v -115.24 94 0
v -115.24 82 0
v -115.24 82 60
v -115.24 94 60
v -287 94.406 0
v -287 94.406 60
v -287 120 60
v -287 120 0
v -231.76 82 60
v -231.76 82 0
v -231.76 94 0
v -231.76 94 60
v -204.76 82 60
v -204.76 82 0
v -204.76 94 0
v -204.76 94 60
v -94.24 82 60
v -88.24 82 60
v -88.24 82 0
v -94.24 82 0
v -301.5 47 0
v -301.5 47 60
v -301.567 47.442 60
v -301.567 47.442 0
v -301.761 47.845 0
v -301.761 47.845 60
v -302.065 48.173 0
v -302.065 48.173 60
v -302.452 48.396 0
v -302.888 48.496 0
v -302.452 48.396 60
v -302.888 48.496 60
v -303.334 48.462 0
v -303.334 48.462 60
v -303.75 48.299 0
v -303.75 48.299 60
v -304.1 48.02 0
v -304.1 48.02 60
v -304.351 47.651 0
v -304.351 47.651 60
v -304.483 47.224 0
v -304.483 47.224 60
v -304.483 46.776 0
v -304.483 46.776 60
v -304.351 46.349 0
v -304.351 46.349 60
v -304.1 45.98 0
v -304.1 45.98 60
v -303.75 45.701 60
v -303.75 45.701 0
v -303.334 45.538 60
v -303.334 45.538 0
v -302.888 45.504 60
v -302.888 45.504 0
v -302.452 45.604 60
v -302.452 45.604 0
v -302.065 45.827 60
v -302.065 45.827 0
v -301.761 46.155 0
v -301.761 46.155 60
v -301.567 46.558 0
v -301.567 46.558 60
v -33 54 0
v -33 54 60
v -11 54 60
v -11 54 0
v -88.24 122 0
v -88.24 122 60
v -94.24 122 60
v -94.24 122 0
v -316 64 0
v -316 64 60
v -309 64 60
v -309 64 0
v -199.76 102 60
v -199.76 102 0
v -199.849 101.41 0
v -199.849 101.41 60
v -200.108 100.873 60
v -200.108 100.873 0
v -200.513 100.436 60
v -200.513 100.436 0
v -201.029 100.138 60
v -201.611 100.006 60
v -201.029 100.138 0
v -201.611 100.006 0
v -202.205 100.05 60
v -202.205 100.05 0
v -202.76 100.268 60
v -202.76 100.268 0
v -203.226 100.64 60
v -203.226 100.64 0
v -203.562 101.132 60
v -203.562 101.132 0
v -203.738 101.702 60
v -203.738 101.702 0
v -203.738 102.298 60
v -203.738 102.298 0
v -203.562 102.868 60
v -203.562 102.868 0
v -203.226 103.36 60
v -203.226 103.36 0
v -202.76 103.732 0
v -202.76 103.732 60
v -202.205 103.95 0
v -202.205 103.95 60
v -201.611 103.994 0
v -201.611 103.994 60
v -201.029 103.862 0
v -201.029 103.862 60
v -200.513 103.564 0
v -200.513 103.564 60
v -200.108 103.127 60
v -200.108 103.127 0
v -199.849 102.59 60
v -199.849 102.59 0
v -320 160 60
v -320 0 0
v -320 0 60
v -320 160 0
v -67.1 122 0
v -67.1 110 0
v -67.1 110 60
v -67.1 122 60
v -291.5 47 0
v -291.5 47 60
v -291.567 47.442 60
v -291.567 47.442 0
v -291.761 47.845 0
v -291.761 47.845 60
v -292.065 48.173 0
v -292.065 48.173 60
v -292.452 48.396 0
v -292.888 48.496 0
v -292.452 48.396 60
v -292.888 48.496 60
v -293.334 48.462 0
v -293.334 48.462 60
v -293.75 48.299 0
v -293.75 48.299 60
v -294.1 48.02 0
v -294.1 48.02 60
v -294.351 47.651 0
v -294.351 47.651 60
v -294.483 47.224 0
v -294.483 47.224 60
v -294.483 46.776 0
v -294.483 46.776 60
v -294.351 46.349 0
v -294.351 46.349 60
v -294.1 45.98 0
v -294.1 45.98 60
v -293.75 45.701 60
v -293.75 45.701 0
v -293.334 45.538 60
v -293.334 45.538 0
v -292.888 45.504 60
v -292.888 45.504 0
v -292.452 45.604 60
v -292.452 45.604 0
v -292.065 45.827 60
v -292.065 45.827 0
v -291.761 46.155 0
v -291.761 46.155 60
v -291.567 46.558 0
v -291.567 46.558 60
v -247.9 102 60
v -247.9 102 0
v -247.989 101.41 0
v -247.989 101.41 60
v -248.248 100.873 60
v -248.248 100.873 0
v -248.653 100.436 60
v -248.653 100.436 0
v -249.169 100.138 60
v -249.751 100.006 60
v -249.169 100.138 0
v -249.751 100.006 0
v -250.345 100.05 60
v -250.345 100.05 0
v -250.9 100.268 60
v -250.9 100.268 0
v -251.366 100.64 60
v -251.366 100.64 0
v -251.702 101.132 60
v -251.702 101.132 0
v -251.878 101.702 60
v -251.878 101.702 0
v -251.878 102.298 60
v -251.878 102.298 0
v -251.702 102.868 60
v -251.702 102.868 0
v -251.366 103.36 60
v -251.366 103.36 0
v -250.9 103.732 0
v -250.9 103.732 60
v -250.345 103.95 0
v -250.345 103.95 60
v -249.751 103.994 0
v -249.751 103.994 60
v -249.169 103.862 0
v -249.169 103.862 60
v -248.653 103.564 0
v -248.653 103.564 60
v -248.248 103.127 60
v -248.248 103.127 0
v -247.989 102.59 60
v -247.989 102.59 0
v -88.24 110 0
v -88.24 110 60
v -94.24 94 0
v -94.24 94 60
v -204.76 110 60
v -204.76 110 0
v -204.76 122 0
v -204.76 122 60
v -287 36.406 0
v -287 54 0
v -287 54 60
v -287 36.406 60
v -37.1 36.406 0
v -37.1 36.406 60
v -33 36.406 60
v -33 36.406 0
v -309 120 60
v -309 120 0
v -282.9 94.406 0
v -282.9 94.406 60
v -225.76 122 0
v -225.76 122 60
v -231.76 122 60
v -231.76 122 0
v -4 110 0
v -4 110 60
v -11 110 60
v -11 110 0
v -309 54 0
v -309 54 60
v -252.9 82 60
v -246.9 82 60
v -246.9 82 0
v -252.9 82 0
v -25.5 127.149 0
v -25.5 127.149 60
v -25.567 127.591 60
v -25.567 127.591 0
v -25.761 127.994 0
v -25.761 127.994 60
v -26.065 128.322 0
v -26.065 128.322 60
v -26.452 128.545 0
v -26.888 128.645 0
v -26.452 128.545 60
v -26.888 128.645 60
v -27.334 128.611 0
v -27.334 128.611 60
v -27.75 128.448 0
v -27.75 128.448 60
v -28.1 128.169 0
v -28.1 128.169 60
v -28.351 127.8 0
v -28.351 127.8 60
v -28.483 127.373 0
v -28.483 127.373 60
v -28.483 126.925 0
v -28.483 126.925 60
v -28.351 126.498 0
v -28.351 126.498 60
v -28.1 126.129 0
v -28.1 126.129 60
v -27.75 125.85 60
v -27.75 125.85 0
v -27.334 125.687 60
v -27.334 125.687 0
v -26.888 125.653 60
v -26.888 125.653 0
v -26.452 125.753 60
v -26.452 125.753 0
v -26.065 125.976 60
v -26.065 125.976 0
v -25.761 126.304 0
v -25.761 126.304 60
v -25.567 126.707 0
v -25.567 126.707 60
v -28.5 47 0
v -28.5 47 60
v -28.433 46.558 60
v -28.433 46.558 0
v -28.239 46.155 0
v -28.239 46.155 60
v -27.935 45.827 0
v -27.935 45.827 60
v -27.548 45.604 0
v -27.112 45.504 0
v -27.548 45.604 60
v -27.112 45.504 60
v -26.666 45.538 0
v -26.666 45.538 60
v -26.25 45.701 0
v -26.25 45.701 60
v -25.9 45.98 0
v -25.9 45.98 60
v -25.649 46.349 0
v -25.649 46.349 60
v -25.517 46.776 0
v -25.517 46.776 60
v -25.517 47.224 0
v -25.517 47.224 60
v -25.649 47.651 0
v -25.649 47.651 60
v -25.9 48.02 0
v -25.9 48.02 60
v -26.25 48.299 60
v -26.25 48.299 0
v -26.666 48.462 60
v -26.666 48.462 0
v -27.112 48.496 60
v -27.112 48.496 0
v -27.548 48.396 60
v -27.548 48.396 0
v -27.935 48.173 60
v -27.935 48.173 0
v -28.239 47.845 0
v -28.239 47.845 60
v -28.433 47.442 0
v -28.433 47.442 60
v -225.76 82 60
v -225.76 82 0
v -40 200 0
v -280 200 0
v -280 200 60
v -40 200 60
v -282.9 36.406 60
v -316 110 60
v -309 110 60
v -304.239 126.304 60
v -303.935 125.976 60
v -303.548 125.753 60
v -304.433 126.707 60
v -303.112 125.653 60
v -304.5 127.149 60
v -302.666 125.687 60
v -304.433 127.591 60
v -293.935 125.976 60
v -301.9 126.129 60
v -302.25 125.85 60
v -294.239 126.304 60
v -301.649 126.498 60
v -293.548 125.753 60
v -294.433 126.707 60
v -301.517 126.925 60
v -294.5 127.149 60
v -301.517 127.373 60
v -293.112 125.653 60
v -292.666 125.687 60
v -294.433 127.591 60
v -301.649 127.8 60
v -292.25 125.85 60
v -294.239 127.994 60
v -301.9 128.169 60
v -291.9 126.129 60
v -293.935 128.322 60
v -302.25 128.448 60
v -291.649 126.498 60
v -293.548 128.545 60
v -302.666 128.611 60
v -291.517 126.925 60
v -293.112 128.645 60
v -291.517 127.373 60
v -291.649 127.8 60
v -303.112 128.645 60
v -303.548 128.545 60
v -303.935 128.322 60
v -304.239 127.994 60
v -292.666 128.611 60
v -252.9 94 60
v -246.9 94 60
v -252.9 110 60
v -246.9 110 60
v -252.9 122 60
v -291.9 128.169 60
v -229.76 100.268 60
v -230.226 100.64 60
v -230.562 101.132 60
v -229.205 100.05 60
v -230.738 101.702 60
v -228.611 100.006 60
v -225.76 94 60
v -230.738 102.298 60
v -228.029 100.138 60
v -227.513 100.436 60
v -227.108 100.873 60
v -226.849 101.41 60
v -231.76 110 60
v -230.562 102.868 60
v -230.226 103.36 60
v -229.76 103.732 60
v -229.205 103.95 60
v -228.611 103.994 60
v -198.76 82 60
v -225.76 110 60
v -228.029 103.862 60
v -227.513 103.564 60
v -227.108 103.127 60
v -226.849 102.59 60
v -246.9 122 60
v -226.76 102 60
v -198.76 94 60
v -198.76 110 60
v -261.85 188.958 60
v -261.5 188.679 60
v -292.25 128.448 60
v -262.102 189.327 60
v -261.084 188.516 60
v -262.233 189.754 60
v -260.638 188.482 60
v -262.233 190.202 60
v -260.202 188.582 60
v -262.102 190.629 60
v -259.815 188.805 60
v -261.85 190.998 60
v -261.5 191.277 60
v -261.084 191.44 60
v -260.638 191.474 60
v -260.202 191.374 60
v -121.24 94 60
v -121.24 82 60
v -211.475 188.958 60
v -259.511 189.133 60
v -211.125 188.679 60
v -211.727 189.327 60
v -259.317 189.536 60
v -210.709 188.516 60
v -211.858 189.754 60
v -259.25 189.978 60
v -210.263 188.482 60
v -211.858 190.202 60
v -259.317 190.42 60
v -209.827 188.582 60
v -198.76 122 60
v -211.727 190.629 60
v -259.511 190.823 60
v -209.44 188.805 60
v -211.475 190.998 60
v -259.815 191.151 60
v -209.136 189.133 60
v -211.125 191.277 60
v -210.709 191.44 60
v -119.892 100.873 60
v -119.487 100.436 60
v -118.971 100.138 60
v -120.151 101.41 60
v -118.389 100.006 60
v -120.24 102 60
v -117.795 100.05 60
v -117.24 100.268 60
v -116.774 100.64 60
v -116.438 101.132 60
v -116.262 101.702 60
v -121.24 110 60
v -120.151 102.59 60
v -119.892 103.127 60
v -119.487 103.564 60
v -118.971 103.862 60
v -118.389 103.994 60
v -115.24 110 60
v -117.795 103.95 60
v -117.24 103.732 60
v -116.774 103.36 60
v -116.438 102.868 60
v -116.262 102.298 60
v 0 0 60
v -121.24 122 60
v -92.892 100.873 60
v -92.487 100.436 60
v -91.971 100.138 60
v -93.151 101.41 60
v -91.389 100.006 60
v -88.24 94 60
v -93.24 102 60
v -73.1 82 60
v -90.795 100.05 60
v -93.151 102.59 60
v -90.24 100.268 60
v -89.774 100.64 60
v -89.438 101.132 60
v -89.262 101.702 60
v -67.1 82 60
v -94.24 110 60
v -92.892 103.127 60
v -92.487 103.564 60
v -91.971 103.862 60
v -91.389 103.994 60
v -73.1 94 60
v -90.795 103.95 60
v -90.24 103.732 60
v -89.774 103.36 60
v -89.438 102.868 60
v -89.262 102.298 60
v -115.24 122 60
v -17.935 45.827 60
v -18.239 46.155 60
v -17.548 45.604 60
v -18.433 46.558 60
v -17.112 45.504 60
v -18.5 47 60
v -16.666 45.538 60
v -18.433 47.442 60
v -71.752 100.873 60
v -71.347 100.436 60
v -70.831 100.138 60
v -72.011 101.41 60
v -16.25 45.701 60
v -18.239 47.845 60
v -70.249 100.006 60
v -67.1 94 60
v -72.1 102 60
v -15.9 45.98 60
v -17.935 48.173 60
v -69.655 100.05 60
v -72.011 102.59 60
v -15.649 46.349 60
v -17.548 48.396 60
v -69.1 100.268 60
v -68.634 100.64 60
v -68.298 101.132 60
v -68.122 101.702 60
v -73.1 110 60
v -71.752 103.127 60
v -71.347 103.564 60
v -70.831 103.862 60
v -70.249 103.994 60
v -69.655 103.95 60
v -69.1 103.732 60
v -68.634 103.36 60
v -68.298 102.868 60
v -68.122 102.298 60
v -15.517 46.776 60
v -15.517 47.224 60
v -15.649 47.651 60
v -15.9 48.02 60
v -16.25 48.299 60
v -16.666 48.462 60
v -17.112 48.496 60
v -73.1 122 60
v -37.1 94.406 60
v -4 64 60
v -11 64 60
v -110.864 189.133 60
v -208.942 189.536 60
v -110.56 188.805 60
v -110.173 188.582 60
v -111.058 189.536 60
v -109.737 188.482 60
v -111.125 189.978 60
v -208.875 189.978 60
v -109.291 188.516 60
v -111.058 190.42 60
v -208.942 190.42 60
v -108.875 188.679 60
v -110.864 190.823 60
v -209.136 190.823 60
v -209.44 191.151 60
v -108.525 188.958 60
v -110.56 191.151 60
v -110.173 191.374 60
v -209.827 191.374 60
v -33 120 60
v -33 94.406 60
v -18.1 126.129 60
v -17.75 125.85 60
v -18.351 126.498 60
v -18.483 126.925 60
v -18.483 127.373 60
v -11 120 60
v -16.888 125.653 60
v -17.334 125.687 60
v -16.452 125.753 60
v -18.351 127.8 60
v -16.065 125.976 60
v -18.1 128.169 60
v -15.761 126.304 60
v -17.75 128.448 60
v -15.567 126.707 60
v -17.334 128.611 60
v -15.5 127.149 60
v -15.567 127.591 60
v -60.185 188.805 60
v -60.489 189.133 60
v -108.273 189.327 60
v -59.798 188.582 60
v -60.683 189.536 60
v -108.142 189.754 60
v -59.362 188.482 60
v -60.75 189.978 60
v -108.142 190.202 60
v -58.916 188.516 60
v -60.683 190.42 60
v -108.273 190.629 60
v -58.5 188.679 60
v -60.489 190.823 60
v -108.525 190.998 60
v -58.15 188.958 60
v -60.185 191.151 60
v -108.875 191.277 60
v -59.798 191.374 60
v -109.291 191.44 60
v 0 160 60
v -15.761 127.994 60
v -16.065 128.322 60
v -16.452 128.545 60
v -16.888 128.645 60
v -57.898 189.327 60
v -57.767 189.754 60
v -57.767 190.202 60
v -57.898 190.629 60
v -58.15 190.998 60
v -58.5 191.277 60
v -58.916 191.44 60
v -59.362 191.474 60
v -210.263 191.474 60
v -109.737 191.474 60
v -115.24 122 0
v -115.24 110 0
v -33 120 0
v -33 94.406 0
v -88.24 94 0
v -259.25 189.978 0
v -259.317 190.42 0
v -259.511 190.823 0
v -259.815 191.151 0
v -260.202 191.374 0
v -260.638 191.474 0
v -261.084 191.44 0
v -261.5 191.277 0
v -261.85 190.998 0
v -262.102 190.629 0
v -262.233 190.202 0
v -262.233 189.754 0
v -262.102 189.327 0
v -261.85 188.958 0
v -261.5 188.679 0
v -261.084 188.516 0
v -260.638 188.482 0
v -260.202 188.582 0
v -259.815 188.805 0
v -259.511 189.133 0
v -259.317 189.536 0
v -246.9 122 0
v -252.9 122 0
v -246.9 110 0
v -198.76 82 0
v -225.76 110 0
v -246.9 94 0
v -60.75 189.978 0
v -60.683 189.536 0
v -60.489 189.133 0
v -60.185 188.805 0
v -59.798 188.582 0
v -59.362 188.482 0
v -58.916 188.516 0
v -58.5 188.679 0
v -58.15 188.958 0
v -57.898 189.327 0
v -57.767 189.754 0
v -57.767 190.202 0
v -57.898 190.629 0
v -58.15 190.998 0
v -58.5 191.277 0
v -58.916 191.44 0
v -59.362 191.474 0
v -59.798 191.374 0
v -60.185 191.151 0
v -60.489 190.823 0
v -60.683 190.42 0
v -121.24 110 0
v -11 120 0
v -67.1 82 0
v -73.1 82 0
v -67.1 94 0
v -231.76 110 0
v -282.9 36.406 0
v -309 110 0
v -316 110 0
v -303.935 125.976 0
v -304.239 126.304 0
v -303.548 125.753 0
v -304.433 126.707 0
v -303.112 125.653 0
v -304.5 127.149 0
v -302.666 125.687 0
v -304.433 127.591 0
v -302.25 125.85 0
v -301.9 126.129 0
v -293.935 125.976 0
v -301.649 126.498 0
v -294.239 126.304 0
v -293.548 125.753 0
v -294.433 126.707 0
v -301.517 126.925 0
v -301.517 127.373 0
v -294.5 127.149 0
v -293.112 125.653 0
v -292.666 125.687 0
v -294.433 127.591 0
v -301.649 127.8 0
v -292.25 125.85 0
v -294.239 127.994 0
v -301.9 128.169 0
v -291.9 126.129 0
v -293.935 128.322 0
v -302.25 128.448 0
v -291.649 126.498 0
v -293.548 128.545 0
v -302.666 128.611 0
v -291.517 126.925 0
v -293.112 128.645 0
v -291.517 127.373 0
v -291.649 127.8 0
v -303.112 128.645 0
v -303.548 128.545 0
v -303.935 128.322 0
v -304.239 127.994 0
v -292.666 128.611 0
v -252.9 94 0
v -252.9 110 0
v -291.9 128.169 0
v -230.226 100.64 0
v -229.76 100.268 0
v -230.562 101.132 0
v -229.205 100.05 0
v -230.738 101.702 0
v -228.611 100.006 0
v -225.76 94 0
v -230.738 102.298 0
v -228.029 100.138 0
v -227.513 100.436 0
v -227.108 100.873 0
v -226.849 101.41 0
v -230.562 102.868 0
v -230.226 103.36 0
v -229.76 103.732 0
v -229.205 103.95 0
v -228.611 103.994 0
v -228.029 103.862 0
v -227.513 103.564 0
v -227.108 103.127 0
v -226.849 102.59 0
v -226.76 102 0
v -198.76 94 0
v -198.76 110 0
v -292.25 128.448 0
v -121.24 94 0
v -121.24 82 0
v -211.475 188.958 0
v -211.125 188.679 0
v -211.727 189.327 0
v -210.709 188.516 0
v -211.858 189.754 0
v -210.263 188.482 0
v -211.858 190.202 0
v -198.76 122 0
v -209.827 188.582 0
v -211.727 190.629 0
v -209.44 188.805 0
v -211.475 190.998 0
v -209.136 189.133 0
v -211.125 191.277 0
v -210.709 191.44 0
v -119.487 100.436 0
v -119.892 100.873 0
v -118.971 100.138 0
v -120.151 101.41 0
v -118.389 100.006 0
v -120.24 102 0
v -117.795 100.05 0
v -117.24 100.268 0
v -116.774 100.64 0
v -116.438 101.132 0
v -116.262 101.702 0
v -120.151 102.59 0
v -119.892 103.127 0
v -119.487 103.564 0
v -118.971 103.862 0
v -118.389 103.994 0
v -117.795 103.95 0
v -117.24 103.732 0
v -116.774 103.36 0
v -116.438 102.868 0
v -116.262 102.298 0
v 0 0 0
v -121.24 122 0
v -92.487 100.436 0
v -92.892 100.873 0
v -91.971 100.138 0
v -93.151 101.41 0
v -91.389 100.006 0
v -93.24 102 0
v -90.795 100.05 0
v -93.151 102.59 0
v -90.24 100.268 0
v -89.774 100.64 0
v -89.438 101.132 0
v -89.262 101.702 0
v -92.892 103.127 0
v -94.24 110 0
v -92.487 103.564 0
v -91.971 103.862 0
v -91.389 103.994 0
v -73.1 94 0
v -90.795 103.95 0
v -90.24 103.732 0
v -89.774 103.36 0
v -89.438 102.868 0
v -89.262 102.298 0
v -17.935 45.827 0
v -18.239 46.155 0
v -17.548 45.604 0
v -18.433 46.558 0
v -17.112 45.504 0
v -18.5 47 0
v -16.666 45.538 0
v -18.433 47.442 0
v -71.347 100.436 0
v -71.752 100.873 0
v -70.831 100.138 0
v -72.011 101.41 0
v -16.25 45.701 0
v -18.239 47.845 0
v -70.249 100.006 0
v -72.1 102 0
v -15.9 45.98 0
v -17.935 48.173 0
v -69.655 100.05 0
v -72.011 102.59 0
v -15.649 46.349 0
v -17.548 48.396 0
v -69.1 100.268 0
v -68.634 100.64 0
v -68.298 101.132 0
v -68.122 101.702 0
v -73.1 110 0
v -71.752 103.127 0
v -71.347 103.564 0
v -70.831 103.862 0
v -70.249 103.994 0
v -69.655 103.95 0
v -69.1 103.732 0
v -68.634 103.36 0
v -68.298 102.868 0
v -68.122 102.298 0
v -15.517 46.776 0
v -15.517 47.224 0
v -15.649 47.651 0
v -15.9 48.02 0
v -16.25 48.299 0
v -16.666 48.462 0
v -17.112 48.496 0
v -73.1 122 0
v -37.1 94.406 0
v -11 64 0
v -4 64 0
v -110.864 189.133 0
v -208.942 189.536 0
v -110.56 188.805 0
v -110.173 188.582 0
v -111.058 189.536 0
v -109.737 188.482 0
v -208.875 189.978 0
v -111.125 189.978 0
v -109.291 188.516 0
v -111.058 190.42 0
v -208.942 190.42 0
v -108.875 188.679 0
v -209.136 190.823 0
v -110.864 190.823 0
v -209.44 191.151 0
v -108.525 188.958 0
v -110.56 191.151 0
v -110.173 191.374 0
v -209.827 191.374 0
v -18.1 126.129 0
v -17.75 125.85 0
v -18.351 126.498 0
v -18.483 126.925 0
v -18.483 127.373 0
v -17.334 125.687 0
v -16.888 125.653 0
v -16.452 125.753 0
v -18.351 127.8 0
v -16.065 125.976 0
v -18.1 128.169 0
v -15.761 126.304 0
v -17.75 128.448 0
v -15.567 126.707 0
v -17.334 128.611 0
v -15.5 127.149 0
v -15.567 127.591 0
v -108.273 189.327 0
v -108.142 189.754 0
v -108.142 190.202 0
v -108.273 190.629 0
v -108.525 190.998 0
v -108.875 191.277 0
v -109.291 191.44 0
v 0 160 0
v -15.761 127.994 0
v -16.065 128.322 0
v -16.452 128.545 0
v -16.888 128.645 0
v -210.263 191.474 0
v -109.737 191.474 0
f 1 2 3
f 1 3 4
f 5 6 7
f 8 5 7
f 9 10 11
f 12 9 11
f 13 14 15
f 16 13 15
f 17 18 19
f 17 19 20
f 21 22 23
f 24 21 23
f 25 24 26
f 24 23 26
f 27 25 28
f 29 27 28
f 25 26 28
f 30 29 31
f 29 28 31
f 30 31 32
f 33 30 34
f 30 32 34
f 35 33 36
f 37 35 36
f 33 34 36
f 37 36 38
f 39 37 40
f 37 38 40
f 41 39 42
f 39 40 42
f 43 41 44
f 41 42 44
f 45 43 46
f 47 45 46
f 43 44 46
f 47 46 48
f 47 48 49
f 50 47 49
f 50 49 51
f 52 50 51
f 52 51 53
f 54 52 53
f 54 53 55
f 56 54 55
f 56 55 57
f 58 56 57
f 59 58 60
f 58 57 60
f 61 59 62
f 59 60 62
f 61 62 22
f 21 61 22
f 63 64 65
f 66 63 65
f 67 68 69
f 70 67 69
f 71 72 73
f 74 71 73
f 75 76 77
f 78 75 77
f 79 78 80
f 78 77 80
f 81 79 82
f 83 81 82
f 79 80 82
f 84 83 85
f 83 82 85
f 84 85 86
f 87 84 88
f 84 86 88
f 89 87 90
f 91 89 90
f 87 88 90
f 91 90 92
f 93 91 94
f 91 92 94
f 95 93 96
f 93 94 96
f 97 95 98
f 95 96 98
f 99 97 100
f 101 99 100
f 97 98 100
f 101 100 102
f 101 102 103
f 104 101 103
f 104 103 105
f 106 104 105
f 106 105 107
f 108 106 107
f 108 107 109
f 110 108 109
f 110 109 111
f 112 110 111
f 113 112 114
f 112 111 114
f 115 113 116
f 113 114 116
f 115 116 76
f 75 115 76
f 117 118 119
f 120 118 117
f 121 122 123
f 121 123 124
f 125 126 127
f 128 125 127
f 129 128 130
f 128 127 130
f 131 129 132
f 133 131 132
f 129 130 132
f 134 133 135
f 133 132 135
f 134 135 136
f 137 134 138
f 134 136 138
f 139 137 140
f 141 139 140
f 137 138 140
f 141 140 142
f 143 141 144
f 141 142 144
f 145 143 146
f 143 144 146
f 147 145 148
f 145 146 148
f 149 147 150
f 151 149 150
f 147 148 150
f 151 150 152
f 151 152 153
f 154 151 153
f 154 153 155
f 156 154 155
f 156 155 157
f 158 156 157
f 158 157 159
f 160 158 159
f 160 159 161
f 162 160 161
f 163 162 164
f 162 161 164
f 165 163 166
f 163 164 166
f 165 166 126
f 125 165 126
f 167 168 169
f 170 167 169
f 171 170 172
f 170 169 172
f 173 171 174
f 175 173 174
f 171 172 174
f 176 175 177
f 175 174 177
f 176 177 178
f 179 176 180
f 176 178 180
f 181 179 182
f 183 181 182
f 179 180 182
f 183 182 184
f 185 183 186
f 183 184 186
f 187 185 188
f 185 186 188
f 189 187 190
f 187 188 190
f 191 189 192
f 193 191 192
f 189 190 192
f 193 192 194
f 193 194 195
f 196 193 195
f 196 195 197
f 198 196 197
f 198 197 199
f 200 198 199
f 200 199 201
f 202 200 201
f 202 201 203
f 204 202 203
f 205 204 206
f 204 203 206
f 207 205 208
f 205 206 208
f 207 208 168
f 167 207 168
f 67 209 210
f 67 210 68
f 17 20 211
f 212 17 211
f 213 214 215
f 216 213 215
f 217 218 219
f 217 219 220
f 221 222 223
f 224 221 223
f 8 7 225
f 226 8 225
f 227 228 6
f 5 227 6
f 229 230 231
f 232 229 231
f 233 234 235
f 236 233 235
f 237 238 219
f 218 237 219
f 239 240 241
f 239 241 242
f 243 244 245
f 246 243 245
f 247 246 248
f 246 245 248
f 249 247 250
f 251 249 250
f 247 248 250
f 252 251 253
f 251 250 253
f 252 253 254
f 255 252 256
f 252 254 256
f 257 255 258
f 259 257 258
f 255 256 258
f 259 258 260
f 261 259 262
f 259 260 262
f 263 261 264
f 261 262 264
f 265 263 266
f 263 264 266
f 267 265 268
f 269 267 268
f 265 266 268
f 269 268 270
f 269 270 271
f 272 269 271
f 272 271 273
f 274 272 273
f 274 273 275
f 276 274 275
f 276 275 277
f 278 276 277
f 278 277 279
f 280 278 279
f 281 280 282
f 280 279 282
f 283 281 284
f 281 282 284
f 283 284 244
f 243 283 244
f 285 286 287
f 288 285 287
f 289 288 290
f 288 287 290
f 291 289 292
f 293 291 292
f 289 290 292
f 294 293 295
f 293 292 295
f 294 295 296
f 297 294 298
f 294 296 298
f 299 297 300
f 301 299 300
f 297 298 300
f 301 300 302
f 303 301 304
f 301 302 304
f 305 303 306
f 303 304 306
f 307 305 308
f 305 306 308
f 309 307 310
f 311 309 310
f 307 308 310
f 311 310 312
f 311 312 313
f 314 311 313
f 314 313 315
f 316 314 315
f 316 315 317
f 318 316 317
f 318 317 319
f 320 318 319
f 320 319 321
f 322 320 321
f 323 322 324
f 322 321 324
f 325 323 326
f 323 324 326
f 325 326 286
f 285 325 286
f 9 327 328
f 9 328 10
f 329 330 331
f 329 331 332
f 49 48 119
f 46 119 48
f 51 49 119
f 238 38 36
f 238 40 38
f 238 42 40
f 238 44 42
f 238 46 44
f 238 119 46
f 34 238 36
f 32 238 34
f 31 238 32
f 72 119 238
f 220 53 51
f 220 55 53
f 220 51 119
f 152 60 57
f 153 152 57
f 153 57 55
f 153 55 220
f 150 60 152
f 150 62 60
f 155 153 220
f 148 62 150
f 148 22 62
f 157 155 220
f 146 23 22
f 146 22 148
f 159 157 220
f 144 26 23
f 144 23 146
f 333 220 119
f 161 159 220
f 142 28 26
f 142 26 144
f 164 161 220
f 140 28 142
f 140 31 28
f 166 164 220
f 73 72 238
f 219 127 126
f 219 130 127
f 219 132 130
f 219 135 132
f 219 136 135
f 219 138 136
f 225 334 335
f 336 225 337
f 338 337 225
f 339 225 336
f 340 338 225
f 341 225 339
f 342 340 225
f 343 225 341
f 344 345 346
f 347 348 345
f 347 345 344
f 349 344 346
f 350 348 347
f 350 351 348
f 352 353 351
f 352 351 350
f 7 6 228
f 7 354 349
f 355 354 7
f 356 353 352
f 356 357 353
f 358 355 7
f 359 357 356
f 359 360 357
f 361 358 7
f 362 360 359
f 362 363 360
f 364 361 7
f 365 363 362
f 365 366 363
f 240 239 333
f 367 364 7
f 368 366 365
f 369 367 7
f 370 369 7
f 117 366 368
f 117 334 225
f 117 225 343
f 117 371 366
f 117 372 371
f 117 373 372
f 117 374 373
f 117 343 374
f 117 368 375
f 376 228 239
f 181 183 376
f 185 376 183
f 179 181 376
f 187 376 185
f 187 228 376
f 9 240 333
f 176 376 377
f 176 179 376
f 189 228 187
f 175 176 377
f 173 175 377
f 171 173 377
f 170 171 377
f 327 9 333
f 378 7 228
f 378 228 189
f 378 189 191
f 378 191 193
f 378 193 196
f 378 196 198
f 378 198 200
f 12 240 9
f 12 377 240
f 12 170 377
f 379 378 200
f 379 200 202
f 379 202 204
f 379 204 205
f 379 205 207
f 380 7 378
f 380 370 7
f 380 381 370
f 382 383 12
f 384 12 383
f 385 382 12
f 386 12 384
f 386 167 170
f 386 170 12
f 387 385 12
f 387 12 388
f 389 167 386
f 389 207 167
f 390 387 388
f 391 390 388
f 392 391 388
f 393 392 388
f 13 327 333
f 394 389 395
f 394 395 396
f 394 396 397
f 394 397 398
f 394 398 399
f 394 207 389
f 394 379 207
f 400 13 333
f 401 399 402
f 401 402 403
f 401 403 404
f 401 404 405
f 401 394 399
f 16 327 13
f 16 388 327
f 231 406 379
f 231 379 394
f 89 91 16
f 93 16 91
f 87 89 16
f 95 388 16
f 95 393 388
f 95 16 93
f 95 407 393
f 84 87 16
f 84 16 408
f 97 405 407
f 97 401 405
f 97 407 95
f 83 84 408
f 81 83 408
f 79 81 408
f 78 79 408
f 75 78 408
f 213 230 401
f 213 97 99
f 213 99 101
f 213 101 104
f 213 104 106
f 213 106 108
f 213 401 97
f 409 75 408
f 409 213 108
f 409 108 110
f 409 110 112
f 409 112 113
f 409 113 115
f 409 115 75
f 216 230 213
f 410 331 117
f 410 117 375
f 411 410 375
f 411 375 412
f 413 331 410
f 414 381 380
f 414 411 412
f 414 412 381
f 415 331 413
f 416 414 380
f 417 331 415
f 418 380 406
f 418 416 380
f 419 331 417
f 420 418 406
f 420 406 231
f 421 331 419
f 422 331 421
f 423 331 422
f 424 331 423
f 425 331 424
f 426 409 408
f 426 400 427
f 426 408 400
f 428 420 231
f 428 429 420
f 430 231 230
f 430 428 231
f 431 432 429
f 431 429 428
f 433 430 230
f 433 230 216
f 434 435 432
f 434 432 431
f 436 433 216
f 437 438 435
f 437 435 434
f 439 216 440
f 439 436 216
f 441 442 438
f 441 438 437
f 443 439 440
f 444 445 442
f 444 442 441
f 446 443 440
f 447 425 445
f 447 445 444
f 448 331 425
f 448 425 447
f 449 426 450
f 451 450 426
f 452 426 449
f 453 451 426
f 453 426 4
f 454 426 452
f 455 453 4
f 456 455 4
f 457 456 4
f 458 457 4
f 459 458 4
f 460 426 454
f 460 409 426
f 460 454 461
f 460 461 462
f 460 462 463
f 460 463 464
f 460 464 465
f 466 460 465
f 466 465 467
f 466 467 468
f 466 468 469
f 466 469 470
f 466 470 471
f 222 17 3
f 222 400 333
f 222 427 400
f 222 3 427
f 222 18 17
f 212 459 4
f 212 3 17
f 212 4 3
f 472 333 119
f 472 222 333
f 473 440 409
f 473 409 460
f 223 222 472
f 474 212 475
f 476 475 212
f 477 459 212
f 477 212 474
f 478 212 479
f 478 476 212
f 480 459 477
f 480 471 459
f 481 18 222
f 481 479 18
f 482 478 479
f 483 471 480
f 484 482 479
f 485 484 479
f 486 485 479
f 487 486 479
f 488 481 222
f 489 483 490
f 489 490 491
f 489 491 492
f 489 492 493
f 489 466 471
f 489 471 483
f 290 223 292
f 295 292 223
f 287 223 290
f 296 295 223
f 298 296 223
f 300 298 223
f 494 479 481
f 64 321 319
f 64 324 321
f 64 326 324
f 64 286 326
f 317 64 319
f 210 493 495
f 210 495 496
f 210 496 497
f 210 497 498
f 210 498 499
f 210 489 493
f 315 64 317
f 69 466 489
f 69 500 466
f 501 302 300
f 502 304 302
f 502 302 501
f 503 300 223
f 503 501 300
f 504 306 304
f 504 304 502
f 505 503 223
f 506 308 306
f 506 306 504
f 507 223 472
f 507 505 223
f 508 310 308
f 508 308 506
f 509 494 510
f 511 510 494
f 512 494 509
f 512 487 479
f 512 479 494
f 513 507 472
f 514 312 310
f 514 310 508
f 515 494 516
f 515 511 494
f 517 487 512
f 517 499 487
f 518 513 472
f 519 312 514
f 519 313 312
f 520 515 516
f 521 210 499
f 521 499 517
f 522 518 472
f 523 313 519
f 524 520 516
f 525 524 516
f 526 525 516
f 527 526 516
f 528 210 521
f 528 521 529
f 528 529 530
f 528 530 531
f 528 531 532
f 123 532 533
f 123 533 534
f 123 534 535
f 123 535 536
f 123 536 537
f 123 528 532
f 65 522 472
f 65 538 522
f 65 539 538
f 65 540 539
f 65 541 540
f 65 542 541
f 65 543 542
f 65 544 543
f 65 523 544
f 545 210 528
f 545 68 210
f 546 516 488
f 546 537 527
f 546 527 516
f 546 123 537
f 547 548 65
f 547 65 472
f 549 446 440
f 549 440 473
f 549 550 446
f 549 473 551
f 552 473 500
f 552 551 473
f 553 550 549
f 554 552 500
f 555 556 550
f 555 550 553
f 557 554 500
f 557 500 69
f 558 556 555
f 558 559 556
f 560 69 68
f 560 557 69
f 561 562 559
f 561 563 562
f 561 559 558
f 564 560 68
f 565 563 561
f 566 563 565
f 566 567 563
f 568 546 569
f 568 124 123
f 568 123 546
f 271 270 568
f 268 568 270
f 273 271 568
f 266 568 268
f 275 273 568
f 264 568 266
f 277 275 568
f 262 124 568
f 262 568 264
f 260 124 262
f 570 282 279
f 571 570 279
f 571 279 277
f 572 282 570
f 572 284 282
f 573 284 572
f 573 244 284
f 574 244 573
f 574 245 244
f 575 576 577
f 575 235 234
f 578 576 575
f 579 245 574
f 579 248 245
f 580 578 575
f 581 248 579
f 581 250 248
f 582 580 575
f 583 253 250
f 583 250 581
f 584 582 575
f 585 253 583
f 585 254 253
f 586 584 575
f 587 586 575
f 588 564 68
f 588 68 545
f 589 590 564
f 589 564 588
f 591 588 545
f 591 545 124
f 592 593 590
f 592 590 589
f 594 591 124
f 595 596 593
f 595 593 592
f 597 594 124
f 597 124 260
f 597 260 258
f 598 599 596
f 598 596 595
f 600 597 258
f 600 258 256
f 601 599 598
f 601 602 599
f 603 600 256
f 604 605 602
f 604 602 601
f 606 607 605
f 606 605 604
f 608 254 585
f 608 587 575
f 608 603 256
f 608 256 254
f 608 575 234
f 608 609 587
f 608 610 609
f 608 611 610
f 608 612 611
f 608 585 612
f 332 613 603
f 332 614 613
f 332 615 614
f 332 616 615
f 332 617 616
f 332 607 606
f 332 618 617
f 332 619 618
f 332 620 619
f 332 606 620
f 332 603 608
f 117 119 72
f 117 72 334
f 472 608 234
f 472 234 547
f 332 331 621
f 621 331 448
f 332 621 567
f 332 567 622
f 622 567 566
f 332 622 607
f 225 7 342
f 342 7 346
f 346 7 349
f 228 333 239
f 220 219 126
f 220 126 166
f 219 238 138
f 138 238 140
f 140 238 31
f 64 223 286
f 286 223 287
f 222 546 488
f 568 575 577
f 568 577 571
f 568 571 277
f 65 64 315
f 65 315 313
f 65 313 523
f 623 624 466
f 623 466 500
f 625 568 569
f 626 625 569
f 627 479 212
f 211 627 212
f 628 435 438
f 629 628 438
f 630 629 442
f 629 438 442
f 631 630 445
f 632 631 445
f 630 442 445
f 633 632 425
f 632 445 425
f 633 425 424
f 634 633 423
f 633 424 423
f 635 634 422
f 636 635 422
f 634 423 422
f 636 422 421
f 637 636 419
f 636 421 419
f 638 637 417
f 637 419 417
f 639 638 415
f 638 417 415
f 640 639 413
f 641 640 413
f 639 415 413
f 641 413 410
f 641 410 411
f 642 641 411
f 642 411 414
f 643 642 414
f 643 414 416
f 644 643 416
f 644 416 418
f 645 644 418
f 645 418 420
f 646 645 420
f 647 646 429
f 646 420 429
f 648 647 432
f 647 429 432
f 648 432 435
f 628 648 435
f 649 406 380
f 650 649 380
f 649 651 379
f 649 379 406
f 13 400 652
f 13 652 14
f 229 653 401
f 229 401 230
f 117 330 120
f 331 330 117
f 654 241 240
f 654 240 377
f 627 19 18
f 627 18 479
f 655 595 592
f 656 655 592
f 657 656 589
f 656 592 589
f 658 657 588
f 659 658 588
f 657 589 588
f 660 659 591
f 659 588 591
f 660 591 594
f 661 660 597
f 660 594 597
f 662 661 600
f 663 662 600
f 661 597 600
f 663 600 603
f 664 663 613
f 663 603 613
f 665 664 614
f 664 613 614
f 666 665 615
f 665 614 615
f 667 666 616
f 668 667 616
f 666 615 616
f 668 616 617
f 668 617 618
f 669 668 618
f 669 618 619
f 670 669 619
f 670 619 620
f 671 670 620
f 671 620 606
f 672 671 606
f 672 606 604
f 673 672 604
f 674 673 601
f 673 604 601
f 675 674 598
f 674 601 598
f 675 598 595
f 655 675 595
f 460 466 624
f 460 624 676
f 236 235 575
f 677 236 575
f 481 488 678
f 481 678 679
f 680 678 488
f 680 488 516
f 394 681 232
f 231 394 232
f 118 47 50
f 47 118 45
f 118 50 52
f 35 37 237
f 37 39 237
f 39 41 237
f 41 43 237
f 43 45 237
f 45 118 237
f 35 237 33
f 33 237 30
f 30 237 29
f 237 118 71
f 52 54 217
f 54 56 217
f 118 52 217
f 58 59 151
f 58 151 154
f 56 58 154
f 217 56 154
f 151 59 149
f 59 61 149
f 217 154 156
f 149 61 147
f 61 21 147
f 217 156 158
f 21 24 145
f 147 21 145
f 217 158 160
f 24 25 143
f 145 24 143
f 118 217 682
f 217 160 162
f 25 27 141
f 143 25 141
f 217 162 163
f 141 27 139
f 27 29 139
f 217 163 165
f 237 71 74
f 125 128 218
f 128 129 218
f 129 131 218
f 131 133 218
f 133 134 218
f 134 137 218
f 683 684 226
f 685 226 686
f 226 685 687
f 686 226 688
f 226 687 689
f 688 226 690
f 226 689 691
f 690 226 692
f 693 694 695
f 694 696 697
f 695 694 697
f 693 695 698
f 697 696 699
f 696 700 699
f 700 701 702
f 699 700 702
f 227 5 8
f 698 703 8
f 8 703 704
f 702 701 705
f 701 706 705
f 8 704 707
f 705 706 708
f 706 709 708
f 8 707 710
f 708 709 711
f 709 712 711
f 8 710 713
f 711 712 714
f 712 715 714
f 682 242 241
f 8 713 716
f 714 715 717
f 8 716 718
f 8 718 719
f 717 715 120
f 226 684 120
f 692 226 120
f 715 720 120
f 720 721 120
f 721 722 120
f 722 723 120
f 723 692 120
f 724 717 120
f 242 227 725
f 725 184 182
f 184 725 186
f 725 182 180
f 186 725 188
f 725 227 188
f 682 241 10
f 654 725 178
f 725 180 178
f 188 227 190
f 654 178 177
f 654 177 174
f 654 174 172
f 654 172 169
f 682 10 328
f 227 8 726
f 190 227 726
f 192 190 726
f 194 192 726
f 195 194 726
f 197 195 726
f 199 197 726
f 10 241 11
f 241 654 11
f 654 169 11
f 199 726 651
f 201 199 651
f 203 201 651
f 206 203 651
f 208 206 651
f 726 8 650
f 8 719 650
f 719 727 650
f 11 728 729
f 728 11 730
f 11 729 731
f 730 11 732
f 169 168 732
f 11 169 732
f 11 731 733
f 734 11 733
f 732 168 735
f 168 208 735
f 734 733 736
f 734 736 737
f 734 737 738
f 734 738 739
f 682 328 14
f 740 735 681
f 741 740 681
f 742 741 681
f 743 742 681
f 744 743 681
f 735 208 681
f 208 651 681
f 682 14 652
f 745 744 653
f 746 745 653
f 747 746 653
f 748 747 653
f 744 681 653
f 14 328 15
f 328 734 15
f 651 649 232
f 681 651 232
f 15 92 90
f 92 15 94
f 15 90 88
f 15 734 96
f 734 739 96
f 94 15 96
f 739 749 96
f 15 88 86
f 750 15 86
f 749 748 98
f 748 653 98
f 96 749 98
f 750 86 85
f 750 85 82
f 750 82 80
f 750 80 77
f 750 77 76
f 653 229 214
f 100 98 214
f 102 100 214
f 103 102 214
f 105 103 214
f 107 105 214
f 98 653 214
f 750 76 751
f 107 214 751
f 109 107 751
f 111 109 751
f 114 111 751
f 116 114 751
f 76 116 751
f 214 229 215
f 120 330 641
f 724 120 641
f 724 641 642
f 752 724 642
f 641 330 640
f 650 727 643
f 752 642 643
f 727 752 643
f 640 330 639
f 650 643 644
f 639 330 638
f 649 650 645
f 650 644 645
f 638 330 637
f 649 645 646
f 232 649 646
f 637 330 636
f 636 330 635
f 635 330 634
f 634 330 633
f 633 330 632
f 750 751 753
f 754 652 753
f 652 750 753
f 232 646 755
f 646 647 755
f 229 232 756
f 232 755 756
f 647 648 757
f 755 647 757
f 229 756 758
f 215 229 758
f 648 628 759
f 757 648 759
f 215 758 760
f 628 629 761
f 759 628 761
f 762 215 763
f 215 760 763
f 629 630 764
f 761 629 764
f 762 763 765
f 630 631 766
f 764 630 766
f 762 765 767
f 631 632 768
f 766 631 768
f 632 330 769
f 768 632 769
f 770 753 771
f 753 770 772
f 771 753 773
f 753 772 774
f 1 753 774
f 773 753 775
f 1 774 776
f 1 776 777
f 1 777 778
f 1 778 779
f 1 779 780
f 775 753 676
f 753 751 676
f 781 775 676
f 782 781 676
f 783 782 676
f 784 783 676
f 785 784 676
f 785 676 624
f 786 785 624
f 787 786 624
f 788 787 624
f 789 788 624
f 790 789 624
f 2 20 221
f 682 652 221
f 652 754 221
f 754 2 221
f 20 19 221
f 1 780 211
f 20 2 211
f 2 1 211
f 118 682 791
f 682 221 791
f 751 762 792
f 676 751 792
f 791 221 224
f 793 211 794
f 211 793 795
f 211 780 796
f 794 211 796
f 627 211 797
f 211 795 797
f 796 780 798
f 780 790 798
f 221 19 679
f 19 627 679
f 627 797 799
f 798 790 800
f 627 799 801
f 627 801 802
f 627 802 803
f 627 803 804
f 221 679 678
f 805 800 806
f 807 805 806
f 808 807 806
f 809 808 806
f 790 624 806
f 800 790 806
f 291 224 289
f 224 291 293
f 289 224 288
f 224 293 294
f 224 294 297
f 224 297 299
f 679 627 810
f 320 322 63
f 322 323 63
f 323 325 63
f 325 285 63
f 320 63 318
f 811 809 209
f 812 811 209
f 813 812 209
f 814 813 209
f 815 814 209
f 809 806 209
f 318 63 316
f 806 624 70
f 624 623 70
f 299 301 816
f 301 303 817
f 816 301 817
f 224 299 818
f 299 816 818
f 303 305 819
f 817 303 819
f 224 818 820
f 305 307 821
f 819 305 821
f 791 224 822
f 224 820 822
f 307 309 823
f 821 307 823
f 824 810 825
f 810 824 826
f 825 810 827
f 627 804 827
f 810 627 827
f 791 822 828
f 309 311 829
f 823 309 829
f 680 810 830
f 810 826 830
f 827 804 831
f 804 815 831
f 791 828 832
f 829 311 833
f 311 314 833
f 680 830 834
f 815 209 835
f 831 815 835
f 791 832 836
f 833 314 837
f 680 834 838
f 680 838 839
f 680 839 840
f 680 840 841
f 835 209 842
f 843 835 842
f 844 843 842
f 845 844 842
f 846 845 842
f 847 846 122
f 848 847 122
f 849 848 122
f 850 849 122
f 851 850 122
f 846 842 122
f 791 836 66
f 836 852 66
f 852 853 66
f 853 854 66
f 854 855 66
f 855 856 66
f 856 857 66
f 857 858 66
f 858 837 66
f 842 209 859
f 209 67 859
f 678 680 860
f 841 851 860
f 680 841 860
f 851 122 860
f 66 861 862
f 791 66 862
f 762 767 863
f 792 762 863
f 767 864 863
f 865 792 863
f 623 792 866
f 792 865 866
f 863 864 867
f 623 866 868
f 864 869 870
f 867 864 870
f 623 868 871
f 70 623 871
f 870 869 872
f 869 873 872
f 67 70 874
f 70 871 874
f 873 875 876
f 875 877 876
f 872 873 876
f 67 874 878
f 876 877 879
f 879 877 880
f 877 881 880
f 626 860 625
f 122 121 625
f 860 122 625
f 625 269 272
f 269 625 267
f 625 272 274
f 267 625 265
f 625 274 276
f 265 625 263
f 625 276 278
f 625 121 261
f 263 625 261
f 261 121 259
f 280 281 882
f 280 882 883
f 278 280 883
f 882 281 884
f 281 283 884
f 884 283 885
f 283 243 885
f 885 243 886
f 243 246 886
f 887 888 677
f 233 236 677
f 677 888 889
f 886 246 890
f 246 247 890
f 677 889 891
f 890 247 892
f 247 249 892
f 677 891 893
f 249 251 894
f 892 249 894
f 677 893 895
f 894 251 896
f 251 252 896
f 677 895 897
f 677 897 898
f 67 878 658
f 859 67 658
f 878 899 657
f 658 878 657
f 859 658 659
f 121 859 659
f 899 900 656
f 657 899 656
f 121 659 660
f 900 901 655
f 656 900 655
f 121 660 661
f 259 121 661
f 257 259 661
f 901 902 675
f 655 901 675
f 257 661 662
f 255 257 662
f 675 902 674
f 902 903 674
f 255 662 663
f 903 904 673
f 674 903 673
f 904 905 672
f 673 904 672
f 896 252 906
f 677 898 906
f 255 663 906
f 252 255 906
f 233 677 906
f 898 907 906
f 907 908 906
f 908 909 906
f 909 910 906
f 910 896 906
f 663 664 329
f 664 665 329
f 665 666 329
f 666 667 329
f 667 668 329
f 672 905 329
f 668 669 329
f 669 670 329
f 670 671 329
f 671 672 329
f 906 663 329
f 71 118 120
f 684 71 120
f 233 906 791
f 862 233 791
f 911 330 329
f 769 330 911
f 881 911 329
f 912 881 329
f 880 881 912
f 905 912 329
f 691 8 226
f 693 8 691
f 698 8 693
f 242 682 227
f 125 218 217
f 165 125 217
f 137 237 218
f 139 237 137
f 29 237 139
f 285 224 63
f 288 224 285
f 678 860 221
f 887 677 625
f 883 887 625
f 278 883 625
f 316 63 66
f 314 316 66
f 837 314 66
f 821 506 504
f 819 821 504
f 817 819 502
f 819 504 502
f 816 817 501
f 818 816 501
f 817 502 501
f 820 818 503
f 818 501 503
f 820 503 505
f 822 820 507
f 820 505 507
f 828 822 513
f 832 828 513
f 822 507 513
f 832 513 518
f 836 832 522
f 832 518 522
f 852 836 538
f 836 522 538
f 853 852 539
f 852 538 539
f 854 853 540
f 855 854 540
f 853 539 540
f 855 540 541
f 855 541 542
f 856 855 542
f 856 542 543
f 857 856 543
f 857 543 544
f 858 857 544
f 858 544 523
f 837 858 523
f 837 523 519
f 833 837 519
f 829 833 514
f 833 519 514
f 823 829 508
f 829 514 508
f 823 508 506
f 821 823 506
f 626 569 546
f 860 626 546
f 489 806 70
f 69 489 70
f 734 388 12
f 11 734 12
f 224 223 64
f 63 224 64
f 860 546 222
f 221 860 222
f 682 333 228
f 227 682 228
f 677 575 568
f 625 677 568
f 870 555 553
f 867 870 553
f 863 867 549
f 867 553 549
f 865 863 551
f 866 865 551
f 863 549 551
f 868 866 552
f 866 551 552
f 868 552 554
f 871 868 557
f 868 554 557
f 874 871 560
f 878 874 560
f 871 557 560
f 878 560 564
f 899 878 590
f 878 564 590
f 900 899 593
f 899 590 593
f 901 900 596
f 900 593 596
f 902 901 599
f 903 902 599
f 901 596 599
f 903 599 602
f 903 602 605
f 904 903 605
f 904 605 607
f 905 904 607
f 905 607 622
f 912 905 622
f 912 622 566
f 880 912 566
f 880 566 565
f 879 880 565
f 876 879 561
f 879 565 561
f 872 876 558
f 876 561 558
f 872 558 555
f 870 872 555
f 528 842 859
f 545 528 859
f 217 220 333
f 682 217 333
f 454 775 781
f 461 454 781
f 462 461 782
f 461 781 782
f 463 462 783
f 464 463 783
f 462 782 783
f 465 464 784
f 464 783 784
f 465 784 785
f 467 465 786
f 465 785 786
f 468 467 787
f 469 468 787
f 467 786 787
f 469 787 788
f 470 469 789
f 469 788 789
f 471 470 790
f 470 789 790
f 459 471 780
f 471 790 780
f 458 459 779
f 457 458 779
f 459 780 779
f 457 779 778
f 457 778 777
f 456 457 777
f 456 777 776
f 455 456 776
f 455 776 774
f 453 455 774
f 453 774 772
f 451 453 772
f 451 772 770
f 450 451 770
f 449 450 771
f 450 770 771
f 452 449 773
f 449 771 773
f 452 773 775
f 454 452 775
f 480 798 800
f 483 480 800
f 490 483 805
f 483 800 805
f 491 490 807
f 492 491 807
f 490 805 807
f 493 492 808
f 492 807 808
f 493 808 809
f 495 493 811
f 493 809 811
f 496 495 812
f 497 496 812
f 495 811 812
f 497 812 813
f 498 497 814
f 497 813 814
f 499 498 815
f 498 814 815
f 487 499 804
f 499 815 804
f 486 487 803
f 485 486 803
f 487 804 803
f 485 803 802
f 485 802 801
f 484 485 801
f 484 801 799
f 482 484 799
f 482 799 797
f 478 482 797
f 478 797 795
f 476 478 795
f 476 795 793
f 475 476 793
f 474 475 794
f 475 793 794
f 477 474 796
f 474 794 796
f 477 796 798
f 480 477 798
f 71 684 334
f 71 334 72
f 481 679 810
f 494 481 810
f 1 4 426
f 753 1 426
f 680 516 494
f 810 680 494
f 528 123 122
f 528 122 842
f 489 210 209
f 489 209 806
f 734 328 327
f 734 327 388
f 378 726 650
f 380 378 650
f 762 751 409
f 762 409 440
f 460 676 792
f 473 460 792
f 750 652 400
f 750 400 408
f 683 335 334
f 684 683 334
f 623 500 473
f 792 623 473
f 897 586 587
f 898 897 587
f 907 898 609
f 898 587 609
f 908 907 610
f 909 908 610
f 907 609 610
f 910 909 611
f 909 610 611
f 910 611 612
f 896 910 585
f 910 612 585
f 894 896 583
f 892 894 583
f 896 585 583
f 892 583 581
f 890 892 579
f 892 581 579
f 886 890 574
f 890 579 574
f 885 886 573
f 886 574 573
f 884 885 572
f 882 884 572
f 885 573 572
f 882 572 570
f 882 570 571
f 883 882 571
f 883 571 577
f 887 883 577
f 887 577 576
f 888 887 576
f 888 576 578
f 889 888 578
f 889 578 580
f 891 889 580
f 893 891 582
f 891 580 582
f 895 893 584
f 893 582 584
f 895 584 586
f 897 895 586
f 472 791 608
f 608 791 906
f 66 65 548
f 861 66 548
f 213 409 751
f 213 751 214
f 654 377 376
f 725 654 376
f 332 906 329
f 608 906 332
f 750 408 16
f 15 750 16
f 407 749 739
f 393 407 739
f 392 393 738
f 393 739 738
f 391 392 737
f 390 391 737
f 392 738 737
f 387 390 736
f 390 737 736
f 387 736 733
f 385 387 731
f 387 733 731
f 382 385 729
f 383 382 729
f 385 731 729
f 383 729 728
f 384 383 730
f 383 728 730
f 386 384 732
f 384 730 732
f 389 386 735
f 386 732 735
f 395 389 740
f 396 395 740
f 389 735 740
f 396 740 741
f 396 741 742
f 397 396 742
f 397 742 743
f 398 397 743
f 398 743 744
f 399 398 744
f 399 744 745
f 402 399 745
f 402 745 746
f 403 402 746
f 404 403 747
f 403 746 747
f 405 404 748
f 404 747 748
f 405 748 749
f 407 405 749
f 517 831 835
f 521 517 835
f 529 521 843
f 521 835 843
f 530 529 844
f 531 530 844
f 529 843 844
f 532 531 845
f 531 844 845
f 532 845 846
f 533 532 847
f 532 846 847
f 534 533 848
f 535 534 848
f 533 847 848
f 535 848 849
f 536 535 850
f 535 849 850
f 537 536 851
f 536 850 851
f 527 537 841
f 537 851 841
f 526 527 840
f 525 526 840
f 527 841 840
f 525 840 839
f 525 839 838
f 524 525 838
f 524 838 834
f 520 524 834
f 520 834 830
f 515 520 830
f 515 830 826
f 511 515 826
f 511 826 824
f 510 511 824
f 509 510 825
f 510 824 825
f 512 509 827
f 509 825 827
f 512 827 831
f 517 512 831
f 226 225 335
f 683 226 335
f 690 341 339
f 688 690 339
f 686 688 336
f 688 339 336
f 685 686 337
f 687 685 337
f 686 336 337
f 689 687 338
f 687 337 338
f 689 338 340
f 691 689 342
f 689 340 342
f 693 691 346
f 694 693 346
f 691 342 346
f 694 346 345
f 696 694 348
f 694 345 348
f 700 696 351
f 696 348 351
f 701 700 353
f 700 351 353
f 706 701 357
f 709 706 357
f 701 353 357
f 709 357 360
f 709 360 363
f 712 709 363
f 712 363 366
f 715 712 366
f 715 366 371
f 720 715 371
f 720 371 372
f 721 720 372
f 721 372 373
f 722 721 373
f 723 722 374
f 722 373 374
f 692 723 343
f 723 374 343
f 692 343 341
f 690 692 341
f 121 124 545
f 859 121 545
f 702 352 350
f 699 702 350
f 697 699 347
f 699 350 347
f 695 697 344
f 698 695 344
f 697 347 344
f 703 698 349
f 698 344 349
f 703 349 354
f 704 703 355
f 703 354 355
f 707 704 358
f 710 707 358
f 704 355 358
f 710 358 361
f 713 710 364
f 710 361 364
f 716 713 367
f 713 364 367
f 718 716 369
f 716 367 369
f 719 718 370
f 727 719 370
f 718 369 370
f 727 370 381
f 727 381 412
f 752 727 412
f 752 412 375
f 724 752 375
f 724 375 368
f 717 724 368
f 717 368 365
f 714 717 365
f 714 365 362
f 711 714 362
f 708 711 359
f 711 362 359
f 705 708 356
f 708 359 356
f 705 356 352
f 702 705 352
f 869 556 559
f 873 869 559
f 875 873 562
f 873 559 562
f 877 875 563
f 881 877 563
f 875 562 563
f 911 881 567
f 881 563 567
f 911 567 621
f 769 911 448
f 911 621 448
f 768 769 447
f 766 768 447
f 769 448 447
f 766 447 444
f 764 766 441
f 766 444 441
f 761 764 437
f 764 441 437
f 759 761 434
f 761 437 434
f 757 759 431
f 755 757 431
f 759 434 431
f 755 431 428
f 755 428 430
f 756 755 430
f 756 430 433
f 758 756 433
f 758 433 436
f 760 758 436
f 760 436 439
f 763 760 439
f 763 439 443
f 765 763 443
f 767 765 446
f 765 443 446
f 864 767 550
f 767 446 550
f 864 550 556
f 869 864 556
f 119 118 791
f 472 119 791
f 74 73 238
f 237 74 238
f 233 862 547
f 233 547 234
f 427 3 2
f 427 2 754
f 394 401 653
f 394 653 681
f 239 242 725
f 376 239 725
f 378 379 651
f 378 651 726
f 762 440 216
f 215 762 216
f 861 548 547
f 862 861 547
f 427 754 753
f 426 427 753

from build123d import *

# Parameters (mm, degrees)
ESQUISSE1_W             = 320
ESQUISSE1_H             = 200
BOSS_EXTRU_1_DEPTH      = 60
ESQUISSE3_R             = 2
ESQUISSE3_W             = 6
ESQUISSE3_H             = 12
ENL_V_MAT_EXTRU_2_DEPTH = 60
CHANFREIN1_SIZE         = 40
ESQUISSE6_R             = 1.5
ENL_V_MAT_EXTRU_3_DEPTH = 60


with BuildPart() as part:
    # Esquisse1 → Boss.-Extru.1 (new body)
    with BuildSketch(Plane.XY):
        with Locations((-160, 100)):
            Rectangle(ESQUISSE1_W, ESQUISSE1_H)
    extrude(amount=BOSS_EXTRU_1_DEPTH)

    # Esquisse3 → Enlèv. mat.-Extru.2 (cut)
    with BuildSketch(Plane(origin=(0, 0, 0), x_dir=(-1, 0, 0), z_dir=(0, 0, -1))):
        with Locations((70.1, 102)):
            Circle(ESQUISSE3_R)
        with Locations((91.24, 102)):
            Circle(ESQUISSE3_R)
        with Locations((118.24, 102)):
            Circle(ESQUISSE3_R)
        with Locations(Location((201.76, 102, 0), (0, 0, 180))):
            Circle(ESQUISSE3_R)
        with Locations(Location((228.76, 102, 0), (0, 0, 180))):
            Circle(ESQUISSE3_R)
        with Locations(Location((249.9, 102, 0), (0, 0, 180))):
            Circle(ESQUISSE3_R)
        with Locations((70.1, 88)):
            Rectangle(ESQUISSE3_W, ESQUISSE3_H)
        with Locations((70.1, 116)):
            Rectangle(ESQUISSE3_W, ESQUISSE3_H)
        with Locations((91.24, 88)):
            Rectangle(ESQUISSE3_W, ESQUISSE3_H)
        with Locations((91.24, 116)):
            Rectangle(ESQUISSE3_W, ESQUISSE3_H)
        with Locations((118.24, 88)):
            Rectangle(ESQUISSE3_W, ESQUISSE3_H)
        with Locations((118.24, 116)):
            Rectangle(ESQUISSE3_W, ESQUISSE3_H)
        with Locations((201.76, 88)):
            Rectangle(ESQUISSE3_W, ESQUISSE3_H)
        with Locations((201.76, 116)):
            Rectangle(ESQUISSE3_W, ESQUISSE3_H)
        with Locations((228.76, 88)):
            Rectangle(ESQUISSE3_W, ESQUISSE3_H)
        with Locations((228.76, 116)):
            Rectangle(ESQUISSE3_W, ESQUISSE3_H)
        with Locations((249.9, 88)):
            Rectangle(ESQUISSE3_W, ESQUISSE3_H)
        with Locations((249.9, 116)):
            Rectangle(ESQUISSE3_W, ESQUISSE3_H)
    extrude(amount=-ENL_V_MAT_EXTRU_2_DEPTH, mode=Mode.SUBTRACT)

    # Chanfrein1
    chanfrein1_edges = [part.edges().sort_by_distance(p)[0] for p in [
        (-320, 200, 30),
        (0, 200, 30),
    ]]
    chamfer(chanfrein1_edges, length=CHANFREIN1_SIZE)

    # Esquisse6 → Enlèv. mat.-Extru.3 (cut)
    with BuildSketch(Plane.XY.offset(60)):
        with Locations((-260.750206469, 189.977960498)):
            Circle(ESQUISSE6_R)
        with Locations((-210.375103235, 189.977960498)):
            Circle(ESQUISSE6_R)
        with Locations(Location((-109.624896765, 189.977960498, 0), (0, 0, 180))):
            Circle(ESQUISSE6_R)
        with Locations(Location((-59.249793531, 189.977960498, 0), (0, 0, 180))):
            Circle(ESQUISSE6_R)
        with Locations((-303, 47)):
            Circle(ESQUISSE6_R)
        with Locations((-293, 47)):
            Circle(ESQUISSE6_R)
        with Locations(Location((-293, 127.148940914, 0), (0, 0, 180))):
            Circle(ESQUISSE6_R)
        with Locations(Location((-303, 127.148940914, 0), (0, 0, 180))):
            Circle(ESQUISSE6_R)
        with Locations(Location((-27, 47, 0), (0, 0, 180))):
            Circle(ESQUISSE6_R)
        with Locations(Location((-17, 47, 0), (0, 0, 180))):
            Circle(ESQUISSE6_R)
        with Locations((-17, 127.148940914)):
            Circle(ESQUISSE6_R)
        with Locations((-27, 127.148940914)):
            Circle(ESQUISSE6_R)
        Polygon((-287, 120), (-309, 120), (-309, 110), (-316, 110), (-316, 64), (-309, 64), (-309, 54), (-287, 54), (-287, 36.405681604), (-282.9, 36.405681604), (-282.9, 94.405681604), (-287, 94.405681604), align=None)
        Polygon((-33, 36.405681604), (-33, 54), (-11, 54), (-11, 64), (-4, 64), (-4, 110), (-11, 110), (-11, 120), (-33, 120), (-33, 94.405681604), (-37.1, 94.405681604), (-37.1, 36.405681604), align=None)
    extrude(amount=-ENL_V_MAT_EXTRU_3_DEPTH, mode=Mode.SUBTRACT)


solid = part.part
